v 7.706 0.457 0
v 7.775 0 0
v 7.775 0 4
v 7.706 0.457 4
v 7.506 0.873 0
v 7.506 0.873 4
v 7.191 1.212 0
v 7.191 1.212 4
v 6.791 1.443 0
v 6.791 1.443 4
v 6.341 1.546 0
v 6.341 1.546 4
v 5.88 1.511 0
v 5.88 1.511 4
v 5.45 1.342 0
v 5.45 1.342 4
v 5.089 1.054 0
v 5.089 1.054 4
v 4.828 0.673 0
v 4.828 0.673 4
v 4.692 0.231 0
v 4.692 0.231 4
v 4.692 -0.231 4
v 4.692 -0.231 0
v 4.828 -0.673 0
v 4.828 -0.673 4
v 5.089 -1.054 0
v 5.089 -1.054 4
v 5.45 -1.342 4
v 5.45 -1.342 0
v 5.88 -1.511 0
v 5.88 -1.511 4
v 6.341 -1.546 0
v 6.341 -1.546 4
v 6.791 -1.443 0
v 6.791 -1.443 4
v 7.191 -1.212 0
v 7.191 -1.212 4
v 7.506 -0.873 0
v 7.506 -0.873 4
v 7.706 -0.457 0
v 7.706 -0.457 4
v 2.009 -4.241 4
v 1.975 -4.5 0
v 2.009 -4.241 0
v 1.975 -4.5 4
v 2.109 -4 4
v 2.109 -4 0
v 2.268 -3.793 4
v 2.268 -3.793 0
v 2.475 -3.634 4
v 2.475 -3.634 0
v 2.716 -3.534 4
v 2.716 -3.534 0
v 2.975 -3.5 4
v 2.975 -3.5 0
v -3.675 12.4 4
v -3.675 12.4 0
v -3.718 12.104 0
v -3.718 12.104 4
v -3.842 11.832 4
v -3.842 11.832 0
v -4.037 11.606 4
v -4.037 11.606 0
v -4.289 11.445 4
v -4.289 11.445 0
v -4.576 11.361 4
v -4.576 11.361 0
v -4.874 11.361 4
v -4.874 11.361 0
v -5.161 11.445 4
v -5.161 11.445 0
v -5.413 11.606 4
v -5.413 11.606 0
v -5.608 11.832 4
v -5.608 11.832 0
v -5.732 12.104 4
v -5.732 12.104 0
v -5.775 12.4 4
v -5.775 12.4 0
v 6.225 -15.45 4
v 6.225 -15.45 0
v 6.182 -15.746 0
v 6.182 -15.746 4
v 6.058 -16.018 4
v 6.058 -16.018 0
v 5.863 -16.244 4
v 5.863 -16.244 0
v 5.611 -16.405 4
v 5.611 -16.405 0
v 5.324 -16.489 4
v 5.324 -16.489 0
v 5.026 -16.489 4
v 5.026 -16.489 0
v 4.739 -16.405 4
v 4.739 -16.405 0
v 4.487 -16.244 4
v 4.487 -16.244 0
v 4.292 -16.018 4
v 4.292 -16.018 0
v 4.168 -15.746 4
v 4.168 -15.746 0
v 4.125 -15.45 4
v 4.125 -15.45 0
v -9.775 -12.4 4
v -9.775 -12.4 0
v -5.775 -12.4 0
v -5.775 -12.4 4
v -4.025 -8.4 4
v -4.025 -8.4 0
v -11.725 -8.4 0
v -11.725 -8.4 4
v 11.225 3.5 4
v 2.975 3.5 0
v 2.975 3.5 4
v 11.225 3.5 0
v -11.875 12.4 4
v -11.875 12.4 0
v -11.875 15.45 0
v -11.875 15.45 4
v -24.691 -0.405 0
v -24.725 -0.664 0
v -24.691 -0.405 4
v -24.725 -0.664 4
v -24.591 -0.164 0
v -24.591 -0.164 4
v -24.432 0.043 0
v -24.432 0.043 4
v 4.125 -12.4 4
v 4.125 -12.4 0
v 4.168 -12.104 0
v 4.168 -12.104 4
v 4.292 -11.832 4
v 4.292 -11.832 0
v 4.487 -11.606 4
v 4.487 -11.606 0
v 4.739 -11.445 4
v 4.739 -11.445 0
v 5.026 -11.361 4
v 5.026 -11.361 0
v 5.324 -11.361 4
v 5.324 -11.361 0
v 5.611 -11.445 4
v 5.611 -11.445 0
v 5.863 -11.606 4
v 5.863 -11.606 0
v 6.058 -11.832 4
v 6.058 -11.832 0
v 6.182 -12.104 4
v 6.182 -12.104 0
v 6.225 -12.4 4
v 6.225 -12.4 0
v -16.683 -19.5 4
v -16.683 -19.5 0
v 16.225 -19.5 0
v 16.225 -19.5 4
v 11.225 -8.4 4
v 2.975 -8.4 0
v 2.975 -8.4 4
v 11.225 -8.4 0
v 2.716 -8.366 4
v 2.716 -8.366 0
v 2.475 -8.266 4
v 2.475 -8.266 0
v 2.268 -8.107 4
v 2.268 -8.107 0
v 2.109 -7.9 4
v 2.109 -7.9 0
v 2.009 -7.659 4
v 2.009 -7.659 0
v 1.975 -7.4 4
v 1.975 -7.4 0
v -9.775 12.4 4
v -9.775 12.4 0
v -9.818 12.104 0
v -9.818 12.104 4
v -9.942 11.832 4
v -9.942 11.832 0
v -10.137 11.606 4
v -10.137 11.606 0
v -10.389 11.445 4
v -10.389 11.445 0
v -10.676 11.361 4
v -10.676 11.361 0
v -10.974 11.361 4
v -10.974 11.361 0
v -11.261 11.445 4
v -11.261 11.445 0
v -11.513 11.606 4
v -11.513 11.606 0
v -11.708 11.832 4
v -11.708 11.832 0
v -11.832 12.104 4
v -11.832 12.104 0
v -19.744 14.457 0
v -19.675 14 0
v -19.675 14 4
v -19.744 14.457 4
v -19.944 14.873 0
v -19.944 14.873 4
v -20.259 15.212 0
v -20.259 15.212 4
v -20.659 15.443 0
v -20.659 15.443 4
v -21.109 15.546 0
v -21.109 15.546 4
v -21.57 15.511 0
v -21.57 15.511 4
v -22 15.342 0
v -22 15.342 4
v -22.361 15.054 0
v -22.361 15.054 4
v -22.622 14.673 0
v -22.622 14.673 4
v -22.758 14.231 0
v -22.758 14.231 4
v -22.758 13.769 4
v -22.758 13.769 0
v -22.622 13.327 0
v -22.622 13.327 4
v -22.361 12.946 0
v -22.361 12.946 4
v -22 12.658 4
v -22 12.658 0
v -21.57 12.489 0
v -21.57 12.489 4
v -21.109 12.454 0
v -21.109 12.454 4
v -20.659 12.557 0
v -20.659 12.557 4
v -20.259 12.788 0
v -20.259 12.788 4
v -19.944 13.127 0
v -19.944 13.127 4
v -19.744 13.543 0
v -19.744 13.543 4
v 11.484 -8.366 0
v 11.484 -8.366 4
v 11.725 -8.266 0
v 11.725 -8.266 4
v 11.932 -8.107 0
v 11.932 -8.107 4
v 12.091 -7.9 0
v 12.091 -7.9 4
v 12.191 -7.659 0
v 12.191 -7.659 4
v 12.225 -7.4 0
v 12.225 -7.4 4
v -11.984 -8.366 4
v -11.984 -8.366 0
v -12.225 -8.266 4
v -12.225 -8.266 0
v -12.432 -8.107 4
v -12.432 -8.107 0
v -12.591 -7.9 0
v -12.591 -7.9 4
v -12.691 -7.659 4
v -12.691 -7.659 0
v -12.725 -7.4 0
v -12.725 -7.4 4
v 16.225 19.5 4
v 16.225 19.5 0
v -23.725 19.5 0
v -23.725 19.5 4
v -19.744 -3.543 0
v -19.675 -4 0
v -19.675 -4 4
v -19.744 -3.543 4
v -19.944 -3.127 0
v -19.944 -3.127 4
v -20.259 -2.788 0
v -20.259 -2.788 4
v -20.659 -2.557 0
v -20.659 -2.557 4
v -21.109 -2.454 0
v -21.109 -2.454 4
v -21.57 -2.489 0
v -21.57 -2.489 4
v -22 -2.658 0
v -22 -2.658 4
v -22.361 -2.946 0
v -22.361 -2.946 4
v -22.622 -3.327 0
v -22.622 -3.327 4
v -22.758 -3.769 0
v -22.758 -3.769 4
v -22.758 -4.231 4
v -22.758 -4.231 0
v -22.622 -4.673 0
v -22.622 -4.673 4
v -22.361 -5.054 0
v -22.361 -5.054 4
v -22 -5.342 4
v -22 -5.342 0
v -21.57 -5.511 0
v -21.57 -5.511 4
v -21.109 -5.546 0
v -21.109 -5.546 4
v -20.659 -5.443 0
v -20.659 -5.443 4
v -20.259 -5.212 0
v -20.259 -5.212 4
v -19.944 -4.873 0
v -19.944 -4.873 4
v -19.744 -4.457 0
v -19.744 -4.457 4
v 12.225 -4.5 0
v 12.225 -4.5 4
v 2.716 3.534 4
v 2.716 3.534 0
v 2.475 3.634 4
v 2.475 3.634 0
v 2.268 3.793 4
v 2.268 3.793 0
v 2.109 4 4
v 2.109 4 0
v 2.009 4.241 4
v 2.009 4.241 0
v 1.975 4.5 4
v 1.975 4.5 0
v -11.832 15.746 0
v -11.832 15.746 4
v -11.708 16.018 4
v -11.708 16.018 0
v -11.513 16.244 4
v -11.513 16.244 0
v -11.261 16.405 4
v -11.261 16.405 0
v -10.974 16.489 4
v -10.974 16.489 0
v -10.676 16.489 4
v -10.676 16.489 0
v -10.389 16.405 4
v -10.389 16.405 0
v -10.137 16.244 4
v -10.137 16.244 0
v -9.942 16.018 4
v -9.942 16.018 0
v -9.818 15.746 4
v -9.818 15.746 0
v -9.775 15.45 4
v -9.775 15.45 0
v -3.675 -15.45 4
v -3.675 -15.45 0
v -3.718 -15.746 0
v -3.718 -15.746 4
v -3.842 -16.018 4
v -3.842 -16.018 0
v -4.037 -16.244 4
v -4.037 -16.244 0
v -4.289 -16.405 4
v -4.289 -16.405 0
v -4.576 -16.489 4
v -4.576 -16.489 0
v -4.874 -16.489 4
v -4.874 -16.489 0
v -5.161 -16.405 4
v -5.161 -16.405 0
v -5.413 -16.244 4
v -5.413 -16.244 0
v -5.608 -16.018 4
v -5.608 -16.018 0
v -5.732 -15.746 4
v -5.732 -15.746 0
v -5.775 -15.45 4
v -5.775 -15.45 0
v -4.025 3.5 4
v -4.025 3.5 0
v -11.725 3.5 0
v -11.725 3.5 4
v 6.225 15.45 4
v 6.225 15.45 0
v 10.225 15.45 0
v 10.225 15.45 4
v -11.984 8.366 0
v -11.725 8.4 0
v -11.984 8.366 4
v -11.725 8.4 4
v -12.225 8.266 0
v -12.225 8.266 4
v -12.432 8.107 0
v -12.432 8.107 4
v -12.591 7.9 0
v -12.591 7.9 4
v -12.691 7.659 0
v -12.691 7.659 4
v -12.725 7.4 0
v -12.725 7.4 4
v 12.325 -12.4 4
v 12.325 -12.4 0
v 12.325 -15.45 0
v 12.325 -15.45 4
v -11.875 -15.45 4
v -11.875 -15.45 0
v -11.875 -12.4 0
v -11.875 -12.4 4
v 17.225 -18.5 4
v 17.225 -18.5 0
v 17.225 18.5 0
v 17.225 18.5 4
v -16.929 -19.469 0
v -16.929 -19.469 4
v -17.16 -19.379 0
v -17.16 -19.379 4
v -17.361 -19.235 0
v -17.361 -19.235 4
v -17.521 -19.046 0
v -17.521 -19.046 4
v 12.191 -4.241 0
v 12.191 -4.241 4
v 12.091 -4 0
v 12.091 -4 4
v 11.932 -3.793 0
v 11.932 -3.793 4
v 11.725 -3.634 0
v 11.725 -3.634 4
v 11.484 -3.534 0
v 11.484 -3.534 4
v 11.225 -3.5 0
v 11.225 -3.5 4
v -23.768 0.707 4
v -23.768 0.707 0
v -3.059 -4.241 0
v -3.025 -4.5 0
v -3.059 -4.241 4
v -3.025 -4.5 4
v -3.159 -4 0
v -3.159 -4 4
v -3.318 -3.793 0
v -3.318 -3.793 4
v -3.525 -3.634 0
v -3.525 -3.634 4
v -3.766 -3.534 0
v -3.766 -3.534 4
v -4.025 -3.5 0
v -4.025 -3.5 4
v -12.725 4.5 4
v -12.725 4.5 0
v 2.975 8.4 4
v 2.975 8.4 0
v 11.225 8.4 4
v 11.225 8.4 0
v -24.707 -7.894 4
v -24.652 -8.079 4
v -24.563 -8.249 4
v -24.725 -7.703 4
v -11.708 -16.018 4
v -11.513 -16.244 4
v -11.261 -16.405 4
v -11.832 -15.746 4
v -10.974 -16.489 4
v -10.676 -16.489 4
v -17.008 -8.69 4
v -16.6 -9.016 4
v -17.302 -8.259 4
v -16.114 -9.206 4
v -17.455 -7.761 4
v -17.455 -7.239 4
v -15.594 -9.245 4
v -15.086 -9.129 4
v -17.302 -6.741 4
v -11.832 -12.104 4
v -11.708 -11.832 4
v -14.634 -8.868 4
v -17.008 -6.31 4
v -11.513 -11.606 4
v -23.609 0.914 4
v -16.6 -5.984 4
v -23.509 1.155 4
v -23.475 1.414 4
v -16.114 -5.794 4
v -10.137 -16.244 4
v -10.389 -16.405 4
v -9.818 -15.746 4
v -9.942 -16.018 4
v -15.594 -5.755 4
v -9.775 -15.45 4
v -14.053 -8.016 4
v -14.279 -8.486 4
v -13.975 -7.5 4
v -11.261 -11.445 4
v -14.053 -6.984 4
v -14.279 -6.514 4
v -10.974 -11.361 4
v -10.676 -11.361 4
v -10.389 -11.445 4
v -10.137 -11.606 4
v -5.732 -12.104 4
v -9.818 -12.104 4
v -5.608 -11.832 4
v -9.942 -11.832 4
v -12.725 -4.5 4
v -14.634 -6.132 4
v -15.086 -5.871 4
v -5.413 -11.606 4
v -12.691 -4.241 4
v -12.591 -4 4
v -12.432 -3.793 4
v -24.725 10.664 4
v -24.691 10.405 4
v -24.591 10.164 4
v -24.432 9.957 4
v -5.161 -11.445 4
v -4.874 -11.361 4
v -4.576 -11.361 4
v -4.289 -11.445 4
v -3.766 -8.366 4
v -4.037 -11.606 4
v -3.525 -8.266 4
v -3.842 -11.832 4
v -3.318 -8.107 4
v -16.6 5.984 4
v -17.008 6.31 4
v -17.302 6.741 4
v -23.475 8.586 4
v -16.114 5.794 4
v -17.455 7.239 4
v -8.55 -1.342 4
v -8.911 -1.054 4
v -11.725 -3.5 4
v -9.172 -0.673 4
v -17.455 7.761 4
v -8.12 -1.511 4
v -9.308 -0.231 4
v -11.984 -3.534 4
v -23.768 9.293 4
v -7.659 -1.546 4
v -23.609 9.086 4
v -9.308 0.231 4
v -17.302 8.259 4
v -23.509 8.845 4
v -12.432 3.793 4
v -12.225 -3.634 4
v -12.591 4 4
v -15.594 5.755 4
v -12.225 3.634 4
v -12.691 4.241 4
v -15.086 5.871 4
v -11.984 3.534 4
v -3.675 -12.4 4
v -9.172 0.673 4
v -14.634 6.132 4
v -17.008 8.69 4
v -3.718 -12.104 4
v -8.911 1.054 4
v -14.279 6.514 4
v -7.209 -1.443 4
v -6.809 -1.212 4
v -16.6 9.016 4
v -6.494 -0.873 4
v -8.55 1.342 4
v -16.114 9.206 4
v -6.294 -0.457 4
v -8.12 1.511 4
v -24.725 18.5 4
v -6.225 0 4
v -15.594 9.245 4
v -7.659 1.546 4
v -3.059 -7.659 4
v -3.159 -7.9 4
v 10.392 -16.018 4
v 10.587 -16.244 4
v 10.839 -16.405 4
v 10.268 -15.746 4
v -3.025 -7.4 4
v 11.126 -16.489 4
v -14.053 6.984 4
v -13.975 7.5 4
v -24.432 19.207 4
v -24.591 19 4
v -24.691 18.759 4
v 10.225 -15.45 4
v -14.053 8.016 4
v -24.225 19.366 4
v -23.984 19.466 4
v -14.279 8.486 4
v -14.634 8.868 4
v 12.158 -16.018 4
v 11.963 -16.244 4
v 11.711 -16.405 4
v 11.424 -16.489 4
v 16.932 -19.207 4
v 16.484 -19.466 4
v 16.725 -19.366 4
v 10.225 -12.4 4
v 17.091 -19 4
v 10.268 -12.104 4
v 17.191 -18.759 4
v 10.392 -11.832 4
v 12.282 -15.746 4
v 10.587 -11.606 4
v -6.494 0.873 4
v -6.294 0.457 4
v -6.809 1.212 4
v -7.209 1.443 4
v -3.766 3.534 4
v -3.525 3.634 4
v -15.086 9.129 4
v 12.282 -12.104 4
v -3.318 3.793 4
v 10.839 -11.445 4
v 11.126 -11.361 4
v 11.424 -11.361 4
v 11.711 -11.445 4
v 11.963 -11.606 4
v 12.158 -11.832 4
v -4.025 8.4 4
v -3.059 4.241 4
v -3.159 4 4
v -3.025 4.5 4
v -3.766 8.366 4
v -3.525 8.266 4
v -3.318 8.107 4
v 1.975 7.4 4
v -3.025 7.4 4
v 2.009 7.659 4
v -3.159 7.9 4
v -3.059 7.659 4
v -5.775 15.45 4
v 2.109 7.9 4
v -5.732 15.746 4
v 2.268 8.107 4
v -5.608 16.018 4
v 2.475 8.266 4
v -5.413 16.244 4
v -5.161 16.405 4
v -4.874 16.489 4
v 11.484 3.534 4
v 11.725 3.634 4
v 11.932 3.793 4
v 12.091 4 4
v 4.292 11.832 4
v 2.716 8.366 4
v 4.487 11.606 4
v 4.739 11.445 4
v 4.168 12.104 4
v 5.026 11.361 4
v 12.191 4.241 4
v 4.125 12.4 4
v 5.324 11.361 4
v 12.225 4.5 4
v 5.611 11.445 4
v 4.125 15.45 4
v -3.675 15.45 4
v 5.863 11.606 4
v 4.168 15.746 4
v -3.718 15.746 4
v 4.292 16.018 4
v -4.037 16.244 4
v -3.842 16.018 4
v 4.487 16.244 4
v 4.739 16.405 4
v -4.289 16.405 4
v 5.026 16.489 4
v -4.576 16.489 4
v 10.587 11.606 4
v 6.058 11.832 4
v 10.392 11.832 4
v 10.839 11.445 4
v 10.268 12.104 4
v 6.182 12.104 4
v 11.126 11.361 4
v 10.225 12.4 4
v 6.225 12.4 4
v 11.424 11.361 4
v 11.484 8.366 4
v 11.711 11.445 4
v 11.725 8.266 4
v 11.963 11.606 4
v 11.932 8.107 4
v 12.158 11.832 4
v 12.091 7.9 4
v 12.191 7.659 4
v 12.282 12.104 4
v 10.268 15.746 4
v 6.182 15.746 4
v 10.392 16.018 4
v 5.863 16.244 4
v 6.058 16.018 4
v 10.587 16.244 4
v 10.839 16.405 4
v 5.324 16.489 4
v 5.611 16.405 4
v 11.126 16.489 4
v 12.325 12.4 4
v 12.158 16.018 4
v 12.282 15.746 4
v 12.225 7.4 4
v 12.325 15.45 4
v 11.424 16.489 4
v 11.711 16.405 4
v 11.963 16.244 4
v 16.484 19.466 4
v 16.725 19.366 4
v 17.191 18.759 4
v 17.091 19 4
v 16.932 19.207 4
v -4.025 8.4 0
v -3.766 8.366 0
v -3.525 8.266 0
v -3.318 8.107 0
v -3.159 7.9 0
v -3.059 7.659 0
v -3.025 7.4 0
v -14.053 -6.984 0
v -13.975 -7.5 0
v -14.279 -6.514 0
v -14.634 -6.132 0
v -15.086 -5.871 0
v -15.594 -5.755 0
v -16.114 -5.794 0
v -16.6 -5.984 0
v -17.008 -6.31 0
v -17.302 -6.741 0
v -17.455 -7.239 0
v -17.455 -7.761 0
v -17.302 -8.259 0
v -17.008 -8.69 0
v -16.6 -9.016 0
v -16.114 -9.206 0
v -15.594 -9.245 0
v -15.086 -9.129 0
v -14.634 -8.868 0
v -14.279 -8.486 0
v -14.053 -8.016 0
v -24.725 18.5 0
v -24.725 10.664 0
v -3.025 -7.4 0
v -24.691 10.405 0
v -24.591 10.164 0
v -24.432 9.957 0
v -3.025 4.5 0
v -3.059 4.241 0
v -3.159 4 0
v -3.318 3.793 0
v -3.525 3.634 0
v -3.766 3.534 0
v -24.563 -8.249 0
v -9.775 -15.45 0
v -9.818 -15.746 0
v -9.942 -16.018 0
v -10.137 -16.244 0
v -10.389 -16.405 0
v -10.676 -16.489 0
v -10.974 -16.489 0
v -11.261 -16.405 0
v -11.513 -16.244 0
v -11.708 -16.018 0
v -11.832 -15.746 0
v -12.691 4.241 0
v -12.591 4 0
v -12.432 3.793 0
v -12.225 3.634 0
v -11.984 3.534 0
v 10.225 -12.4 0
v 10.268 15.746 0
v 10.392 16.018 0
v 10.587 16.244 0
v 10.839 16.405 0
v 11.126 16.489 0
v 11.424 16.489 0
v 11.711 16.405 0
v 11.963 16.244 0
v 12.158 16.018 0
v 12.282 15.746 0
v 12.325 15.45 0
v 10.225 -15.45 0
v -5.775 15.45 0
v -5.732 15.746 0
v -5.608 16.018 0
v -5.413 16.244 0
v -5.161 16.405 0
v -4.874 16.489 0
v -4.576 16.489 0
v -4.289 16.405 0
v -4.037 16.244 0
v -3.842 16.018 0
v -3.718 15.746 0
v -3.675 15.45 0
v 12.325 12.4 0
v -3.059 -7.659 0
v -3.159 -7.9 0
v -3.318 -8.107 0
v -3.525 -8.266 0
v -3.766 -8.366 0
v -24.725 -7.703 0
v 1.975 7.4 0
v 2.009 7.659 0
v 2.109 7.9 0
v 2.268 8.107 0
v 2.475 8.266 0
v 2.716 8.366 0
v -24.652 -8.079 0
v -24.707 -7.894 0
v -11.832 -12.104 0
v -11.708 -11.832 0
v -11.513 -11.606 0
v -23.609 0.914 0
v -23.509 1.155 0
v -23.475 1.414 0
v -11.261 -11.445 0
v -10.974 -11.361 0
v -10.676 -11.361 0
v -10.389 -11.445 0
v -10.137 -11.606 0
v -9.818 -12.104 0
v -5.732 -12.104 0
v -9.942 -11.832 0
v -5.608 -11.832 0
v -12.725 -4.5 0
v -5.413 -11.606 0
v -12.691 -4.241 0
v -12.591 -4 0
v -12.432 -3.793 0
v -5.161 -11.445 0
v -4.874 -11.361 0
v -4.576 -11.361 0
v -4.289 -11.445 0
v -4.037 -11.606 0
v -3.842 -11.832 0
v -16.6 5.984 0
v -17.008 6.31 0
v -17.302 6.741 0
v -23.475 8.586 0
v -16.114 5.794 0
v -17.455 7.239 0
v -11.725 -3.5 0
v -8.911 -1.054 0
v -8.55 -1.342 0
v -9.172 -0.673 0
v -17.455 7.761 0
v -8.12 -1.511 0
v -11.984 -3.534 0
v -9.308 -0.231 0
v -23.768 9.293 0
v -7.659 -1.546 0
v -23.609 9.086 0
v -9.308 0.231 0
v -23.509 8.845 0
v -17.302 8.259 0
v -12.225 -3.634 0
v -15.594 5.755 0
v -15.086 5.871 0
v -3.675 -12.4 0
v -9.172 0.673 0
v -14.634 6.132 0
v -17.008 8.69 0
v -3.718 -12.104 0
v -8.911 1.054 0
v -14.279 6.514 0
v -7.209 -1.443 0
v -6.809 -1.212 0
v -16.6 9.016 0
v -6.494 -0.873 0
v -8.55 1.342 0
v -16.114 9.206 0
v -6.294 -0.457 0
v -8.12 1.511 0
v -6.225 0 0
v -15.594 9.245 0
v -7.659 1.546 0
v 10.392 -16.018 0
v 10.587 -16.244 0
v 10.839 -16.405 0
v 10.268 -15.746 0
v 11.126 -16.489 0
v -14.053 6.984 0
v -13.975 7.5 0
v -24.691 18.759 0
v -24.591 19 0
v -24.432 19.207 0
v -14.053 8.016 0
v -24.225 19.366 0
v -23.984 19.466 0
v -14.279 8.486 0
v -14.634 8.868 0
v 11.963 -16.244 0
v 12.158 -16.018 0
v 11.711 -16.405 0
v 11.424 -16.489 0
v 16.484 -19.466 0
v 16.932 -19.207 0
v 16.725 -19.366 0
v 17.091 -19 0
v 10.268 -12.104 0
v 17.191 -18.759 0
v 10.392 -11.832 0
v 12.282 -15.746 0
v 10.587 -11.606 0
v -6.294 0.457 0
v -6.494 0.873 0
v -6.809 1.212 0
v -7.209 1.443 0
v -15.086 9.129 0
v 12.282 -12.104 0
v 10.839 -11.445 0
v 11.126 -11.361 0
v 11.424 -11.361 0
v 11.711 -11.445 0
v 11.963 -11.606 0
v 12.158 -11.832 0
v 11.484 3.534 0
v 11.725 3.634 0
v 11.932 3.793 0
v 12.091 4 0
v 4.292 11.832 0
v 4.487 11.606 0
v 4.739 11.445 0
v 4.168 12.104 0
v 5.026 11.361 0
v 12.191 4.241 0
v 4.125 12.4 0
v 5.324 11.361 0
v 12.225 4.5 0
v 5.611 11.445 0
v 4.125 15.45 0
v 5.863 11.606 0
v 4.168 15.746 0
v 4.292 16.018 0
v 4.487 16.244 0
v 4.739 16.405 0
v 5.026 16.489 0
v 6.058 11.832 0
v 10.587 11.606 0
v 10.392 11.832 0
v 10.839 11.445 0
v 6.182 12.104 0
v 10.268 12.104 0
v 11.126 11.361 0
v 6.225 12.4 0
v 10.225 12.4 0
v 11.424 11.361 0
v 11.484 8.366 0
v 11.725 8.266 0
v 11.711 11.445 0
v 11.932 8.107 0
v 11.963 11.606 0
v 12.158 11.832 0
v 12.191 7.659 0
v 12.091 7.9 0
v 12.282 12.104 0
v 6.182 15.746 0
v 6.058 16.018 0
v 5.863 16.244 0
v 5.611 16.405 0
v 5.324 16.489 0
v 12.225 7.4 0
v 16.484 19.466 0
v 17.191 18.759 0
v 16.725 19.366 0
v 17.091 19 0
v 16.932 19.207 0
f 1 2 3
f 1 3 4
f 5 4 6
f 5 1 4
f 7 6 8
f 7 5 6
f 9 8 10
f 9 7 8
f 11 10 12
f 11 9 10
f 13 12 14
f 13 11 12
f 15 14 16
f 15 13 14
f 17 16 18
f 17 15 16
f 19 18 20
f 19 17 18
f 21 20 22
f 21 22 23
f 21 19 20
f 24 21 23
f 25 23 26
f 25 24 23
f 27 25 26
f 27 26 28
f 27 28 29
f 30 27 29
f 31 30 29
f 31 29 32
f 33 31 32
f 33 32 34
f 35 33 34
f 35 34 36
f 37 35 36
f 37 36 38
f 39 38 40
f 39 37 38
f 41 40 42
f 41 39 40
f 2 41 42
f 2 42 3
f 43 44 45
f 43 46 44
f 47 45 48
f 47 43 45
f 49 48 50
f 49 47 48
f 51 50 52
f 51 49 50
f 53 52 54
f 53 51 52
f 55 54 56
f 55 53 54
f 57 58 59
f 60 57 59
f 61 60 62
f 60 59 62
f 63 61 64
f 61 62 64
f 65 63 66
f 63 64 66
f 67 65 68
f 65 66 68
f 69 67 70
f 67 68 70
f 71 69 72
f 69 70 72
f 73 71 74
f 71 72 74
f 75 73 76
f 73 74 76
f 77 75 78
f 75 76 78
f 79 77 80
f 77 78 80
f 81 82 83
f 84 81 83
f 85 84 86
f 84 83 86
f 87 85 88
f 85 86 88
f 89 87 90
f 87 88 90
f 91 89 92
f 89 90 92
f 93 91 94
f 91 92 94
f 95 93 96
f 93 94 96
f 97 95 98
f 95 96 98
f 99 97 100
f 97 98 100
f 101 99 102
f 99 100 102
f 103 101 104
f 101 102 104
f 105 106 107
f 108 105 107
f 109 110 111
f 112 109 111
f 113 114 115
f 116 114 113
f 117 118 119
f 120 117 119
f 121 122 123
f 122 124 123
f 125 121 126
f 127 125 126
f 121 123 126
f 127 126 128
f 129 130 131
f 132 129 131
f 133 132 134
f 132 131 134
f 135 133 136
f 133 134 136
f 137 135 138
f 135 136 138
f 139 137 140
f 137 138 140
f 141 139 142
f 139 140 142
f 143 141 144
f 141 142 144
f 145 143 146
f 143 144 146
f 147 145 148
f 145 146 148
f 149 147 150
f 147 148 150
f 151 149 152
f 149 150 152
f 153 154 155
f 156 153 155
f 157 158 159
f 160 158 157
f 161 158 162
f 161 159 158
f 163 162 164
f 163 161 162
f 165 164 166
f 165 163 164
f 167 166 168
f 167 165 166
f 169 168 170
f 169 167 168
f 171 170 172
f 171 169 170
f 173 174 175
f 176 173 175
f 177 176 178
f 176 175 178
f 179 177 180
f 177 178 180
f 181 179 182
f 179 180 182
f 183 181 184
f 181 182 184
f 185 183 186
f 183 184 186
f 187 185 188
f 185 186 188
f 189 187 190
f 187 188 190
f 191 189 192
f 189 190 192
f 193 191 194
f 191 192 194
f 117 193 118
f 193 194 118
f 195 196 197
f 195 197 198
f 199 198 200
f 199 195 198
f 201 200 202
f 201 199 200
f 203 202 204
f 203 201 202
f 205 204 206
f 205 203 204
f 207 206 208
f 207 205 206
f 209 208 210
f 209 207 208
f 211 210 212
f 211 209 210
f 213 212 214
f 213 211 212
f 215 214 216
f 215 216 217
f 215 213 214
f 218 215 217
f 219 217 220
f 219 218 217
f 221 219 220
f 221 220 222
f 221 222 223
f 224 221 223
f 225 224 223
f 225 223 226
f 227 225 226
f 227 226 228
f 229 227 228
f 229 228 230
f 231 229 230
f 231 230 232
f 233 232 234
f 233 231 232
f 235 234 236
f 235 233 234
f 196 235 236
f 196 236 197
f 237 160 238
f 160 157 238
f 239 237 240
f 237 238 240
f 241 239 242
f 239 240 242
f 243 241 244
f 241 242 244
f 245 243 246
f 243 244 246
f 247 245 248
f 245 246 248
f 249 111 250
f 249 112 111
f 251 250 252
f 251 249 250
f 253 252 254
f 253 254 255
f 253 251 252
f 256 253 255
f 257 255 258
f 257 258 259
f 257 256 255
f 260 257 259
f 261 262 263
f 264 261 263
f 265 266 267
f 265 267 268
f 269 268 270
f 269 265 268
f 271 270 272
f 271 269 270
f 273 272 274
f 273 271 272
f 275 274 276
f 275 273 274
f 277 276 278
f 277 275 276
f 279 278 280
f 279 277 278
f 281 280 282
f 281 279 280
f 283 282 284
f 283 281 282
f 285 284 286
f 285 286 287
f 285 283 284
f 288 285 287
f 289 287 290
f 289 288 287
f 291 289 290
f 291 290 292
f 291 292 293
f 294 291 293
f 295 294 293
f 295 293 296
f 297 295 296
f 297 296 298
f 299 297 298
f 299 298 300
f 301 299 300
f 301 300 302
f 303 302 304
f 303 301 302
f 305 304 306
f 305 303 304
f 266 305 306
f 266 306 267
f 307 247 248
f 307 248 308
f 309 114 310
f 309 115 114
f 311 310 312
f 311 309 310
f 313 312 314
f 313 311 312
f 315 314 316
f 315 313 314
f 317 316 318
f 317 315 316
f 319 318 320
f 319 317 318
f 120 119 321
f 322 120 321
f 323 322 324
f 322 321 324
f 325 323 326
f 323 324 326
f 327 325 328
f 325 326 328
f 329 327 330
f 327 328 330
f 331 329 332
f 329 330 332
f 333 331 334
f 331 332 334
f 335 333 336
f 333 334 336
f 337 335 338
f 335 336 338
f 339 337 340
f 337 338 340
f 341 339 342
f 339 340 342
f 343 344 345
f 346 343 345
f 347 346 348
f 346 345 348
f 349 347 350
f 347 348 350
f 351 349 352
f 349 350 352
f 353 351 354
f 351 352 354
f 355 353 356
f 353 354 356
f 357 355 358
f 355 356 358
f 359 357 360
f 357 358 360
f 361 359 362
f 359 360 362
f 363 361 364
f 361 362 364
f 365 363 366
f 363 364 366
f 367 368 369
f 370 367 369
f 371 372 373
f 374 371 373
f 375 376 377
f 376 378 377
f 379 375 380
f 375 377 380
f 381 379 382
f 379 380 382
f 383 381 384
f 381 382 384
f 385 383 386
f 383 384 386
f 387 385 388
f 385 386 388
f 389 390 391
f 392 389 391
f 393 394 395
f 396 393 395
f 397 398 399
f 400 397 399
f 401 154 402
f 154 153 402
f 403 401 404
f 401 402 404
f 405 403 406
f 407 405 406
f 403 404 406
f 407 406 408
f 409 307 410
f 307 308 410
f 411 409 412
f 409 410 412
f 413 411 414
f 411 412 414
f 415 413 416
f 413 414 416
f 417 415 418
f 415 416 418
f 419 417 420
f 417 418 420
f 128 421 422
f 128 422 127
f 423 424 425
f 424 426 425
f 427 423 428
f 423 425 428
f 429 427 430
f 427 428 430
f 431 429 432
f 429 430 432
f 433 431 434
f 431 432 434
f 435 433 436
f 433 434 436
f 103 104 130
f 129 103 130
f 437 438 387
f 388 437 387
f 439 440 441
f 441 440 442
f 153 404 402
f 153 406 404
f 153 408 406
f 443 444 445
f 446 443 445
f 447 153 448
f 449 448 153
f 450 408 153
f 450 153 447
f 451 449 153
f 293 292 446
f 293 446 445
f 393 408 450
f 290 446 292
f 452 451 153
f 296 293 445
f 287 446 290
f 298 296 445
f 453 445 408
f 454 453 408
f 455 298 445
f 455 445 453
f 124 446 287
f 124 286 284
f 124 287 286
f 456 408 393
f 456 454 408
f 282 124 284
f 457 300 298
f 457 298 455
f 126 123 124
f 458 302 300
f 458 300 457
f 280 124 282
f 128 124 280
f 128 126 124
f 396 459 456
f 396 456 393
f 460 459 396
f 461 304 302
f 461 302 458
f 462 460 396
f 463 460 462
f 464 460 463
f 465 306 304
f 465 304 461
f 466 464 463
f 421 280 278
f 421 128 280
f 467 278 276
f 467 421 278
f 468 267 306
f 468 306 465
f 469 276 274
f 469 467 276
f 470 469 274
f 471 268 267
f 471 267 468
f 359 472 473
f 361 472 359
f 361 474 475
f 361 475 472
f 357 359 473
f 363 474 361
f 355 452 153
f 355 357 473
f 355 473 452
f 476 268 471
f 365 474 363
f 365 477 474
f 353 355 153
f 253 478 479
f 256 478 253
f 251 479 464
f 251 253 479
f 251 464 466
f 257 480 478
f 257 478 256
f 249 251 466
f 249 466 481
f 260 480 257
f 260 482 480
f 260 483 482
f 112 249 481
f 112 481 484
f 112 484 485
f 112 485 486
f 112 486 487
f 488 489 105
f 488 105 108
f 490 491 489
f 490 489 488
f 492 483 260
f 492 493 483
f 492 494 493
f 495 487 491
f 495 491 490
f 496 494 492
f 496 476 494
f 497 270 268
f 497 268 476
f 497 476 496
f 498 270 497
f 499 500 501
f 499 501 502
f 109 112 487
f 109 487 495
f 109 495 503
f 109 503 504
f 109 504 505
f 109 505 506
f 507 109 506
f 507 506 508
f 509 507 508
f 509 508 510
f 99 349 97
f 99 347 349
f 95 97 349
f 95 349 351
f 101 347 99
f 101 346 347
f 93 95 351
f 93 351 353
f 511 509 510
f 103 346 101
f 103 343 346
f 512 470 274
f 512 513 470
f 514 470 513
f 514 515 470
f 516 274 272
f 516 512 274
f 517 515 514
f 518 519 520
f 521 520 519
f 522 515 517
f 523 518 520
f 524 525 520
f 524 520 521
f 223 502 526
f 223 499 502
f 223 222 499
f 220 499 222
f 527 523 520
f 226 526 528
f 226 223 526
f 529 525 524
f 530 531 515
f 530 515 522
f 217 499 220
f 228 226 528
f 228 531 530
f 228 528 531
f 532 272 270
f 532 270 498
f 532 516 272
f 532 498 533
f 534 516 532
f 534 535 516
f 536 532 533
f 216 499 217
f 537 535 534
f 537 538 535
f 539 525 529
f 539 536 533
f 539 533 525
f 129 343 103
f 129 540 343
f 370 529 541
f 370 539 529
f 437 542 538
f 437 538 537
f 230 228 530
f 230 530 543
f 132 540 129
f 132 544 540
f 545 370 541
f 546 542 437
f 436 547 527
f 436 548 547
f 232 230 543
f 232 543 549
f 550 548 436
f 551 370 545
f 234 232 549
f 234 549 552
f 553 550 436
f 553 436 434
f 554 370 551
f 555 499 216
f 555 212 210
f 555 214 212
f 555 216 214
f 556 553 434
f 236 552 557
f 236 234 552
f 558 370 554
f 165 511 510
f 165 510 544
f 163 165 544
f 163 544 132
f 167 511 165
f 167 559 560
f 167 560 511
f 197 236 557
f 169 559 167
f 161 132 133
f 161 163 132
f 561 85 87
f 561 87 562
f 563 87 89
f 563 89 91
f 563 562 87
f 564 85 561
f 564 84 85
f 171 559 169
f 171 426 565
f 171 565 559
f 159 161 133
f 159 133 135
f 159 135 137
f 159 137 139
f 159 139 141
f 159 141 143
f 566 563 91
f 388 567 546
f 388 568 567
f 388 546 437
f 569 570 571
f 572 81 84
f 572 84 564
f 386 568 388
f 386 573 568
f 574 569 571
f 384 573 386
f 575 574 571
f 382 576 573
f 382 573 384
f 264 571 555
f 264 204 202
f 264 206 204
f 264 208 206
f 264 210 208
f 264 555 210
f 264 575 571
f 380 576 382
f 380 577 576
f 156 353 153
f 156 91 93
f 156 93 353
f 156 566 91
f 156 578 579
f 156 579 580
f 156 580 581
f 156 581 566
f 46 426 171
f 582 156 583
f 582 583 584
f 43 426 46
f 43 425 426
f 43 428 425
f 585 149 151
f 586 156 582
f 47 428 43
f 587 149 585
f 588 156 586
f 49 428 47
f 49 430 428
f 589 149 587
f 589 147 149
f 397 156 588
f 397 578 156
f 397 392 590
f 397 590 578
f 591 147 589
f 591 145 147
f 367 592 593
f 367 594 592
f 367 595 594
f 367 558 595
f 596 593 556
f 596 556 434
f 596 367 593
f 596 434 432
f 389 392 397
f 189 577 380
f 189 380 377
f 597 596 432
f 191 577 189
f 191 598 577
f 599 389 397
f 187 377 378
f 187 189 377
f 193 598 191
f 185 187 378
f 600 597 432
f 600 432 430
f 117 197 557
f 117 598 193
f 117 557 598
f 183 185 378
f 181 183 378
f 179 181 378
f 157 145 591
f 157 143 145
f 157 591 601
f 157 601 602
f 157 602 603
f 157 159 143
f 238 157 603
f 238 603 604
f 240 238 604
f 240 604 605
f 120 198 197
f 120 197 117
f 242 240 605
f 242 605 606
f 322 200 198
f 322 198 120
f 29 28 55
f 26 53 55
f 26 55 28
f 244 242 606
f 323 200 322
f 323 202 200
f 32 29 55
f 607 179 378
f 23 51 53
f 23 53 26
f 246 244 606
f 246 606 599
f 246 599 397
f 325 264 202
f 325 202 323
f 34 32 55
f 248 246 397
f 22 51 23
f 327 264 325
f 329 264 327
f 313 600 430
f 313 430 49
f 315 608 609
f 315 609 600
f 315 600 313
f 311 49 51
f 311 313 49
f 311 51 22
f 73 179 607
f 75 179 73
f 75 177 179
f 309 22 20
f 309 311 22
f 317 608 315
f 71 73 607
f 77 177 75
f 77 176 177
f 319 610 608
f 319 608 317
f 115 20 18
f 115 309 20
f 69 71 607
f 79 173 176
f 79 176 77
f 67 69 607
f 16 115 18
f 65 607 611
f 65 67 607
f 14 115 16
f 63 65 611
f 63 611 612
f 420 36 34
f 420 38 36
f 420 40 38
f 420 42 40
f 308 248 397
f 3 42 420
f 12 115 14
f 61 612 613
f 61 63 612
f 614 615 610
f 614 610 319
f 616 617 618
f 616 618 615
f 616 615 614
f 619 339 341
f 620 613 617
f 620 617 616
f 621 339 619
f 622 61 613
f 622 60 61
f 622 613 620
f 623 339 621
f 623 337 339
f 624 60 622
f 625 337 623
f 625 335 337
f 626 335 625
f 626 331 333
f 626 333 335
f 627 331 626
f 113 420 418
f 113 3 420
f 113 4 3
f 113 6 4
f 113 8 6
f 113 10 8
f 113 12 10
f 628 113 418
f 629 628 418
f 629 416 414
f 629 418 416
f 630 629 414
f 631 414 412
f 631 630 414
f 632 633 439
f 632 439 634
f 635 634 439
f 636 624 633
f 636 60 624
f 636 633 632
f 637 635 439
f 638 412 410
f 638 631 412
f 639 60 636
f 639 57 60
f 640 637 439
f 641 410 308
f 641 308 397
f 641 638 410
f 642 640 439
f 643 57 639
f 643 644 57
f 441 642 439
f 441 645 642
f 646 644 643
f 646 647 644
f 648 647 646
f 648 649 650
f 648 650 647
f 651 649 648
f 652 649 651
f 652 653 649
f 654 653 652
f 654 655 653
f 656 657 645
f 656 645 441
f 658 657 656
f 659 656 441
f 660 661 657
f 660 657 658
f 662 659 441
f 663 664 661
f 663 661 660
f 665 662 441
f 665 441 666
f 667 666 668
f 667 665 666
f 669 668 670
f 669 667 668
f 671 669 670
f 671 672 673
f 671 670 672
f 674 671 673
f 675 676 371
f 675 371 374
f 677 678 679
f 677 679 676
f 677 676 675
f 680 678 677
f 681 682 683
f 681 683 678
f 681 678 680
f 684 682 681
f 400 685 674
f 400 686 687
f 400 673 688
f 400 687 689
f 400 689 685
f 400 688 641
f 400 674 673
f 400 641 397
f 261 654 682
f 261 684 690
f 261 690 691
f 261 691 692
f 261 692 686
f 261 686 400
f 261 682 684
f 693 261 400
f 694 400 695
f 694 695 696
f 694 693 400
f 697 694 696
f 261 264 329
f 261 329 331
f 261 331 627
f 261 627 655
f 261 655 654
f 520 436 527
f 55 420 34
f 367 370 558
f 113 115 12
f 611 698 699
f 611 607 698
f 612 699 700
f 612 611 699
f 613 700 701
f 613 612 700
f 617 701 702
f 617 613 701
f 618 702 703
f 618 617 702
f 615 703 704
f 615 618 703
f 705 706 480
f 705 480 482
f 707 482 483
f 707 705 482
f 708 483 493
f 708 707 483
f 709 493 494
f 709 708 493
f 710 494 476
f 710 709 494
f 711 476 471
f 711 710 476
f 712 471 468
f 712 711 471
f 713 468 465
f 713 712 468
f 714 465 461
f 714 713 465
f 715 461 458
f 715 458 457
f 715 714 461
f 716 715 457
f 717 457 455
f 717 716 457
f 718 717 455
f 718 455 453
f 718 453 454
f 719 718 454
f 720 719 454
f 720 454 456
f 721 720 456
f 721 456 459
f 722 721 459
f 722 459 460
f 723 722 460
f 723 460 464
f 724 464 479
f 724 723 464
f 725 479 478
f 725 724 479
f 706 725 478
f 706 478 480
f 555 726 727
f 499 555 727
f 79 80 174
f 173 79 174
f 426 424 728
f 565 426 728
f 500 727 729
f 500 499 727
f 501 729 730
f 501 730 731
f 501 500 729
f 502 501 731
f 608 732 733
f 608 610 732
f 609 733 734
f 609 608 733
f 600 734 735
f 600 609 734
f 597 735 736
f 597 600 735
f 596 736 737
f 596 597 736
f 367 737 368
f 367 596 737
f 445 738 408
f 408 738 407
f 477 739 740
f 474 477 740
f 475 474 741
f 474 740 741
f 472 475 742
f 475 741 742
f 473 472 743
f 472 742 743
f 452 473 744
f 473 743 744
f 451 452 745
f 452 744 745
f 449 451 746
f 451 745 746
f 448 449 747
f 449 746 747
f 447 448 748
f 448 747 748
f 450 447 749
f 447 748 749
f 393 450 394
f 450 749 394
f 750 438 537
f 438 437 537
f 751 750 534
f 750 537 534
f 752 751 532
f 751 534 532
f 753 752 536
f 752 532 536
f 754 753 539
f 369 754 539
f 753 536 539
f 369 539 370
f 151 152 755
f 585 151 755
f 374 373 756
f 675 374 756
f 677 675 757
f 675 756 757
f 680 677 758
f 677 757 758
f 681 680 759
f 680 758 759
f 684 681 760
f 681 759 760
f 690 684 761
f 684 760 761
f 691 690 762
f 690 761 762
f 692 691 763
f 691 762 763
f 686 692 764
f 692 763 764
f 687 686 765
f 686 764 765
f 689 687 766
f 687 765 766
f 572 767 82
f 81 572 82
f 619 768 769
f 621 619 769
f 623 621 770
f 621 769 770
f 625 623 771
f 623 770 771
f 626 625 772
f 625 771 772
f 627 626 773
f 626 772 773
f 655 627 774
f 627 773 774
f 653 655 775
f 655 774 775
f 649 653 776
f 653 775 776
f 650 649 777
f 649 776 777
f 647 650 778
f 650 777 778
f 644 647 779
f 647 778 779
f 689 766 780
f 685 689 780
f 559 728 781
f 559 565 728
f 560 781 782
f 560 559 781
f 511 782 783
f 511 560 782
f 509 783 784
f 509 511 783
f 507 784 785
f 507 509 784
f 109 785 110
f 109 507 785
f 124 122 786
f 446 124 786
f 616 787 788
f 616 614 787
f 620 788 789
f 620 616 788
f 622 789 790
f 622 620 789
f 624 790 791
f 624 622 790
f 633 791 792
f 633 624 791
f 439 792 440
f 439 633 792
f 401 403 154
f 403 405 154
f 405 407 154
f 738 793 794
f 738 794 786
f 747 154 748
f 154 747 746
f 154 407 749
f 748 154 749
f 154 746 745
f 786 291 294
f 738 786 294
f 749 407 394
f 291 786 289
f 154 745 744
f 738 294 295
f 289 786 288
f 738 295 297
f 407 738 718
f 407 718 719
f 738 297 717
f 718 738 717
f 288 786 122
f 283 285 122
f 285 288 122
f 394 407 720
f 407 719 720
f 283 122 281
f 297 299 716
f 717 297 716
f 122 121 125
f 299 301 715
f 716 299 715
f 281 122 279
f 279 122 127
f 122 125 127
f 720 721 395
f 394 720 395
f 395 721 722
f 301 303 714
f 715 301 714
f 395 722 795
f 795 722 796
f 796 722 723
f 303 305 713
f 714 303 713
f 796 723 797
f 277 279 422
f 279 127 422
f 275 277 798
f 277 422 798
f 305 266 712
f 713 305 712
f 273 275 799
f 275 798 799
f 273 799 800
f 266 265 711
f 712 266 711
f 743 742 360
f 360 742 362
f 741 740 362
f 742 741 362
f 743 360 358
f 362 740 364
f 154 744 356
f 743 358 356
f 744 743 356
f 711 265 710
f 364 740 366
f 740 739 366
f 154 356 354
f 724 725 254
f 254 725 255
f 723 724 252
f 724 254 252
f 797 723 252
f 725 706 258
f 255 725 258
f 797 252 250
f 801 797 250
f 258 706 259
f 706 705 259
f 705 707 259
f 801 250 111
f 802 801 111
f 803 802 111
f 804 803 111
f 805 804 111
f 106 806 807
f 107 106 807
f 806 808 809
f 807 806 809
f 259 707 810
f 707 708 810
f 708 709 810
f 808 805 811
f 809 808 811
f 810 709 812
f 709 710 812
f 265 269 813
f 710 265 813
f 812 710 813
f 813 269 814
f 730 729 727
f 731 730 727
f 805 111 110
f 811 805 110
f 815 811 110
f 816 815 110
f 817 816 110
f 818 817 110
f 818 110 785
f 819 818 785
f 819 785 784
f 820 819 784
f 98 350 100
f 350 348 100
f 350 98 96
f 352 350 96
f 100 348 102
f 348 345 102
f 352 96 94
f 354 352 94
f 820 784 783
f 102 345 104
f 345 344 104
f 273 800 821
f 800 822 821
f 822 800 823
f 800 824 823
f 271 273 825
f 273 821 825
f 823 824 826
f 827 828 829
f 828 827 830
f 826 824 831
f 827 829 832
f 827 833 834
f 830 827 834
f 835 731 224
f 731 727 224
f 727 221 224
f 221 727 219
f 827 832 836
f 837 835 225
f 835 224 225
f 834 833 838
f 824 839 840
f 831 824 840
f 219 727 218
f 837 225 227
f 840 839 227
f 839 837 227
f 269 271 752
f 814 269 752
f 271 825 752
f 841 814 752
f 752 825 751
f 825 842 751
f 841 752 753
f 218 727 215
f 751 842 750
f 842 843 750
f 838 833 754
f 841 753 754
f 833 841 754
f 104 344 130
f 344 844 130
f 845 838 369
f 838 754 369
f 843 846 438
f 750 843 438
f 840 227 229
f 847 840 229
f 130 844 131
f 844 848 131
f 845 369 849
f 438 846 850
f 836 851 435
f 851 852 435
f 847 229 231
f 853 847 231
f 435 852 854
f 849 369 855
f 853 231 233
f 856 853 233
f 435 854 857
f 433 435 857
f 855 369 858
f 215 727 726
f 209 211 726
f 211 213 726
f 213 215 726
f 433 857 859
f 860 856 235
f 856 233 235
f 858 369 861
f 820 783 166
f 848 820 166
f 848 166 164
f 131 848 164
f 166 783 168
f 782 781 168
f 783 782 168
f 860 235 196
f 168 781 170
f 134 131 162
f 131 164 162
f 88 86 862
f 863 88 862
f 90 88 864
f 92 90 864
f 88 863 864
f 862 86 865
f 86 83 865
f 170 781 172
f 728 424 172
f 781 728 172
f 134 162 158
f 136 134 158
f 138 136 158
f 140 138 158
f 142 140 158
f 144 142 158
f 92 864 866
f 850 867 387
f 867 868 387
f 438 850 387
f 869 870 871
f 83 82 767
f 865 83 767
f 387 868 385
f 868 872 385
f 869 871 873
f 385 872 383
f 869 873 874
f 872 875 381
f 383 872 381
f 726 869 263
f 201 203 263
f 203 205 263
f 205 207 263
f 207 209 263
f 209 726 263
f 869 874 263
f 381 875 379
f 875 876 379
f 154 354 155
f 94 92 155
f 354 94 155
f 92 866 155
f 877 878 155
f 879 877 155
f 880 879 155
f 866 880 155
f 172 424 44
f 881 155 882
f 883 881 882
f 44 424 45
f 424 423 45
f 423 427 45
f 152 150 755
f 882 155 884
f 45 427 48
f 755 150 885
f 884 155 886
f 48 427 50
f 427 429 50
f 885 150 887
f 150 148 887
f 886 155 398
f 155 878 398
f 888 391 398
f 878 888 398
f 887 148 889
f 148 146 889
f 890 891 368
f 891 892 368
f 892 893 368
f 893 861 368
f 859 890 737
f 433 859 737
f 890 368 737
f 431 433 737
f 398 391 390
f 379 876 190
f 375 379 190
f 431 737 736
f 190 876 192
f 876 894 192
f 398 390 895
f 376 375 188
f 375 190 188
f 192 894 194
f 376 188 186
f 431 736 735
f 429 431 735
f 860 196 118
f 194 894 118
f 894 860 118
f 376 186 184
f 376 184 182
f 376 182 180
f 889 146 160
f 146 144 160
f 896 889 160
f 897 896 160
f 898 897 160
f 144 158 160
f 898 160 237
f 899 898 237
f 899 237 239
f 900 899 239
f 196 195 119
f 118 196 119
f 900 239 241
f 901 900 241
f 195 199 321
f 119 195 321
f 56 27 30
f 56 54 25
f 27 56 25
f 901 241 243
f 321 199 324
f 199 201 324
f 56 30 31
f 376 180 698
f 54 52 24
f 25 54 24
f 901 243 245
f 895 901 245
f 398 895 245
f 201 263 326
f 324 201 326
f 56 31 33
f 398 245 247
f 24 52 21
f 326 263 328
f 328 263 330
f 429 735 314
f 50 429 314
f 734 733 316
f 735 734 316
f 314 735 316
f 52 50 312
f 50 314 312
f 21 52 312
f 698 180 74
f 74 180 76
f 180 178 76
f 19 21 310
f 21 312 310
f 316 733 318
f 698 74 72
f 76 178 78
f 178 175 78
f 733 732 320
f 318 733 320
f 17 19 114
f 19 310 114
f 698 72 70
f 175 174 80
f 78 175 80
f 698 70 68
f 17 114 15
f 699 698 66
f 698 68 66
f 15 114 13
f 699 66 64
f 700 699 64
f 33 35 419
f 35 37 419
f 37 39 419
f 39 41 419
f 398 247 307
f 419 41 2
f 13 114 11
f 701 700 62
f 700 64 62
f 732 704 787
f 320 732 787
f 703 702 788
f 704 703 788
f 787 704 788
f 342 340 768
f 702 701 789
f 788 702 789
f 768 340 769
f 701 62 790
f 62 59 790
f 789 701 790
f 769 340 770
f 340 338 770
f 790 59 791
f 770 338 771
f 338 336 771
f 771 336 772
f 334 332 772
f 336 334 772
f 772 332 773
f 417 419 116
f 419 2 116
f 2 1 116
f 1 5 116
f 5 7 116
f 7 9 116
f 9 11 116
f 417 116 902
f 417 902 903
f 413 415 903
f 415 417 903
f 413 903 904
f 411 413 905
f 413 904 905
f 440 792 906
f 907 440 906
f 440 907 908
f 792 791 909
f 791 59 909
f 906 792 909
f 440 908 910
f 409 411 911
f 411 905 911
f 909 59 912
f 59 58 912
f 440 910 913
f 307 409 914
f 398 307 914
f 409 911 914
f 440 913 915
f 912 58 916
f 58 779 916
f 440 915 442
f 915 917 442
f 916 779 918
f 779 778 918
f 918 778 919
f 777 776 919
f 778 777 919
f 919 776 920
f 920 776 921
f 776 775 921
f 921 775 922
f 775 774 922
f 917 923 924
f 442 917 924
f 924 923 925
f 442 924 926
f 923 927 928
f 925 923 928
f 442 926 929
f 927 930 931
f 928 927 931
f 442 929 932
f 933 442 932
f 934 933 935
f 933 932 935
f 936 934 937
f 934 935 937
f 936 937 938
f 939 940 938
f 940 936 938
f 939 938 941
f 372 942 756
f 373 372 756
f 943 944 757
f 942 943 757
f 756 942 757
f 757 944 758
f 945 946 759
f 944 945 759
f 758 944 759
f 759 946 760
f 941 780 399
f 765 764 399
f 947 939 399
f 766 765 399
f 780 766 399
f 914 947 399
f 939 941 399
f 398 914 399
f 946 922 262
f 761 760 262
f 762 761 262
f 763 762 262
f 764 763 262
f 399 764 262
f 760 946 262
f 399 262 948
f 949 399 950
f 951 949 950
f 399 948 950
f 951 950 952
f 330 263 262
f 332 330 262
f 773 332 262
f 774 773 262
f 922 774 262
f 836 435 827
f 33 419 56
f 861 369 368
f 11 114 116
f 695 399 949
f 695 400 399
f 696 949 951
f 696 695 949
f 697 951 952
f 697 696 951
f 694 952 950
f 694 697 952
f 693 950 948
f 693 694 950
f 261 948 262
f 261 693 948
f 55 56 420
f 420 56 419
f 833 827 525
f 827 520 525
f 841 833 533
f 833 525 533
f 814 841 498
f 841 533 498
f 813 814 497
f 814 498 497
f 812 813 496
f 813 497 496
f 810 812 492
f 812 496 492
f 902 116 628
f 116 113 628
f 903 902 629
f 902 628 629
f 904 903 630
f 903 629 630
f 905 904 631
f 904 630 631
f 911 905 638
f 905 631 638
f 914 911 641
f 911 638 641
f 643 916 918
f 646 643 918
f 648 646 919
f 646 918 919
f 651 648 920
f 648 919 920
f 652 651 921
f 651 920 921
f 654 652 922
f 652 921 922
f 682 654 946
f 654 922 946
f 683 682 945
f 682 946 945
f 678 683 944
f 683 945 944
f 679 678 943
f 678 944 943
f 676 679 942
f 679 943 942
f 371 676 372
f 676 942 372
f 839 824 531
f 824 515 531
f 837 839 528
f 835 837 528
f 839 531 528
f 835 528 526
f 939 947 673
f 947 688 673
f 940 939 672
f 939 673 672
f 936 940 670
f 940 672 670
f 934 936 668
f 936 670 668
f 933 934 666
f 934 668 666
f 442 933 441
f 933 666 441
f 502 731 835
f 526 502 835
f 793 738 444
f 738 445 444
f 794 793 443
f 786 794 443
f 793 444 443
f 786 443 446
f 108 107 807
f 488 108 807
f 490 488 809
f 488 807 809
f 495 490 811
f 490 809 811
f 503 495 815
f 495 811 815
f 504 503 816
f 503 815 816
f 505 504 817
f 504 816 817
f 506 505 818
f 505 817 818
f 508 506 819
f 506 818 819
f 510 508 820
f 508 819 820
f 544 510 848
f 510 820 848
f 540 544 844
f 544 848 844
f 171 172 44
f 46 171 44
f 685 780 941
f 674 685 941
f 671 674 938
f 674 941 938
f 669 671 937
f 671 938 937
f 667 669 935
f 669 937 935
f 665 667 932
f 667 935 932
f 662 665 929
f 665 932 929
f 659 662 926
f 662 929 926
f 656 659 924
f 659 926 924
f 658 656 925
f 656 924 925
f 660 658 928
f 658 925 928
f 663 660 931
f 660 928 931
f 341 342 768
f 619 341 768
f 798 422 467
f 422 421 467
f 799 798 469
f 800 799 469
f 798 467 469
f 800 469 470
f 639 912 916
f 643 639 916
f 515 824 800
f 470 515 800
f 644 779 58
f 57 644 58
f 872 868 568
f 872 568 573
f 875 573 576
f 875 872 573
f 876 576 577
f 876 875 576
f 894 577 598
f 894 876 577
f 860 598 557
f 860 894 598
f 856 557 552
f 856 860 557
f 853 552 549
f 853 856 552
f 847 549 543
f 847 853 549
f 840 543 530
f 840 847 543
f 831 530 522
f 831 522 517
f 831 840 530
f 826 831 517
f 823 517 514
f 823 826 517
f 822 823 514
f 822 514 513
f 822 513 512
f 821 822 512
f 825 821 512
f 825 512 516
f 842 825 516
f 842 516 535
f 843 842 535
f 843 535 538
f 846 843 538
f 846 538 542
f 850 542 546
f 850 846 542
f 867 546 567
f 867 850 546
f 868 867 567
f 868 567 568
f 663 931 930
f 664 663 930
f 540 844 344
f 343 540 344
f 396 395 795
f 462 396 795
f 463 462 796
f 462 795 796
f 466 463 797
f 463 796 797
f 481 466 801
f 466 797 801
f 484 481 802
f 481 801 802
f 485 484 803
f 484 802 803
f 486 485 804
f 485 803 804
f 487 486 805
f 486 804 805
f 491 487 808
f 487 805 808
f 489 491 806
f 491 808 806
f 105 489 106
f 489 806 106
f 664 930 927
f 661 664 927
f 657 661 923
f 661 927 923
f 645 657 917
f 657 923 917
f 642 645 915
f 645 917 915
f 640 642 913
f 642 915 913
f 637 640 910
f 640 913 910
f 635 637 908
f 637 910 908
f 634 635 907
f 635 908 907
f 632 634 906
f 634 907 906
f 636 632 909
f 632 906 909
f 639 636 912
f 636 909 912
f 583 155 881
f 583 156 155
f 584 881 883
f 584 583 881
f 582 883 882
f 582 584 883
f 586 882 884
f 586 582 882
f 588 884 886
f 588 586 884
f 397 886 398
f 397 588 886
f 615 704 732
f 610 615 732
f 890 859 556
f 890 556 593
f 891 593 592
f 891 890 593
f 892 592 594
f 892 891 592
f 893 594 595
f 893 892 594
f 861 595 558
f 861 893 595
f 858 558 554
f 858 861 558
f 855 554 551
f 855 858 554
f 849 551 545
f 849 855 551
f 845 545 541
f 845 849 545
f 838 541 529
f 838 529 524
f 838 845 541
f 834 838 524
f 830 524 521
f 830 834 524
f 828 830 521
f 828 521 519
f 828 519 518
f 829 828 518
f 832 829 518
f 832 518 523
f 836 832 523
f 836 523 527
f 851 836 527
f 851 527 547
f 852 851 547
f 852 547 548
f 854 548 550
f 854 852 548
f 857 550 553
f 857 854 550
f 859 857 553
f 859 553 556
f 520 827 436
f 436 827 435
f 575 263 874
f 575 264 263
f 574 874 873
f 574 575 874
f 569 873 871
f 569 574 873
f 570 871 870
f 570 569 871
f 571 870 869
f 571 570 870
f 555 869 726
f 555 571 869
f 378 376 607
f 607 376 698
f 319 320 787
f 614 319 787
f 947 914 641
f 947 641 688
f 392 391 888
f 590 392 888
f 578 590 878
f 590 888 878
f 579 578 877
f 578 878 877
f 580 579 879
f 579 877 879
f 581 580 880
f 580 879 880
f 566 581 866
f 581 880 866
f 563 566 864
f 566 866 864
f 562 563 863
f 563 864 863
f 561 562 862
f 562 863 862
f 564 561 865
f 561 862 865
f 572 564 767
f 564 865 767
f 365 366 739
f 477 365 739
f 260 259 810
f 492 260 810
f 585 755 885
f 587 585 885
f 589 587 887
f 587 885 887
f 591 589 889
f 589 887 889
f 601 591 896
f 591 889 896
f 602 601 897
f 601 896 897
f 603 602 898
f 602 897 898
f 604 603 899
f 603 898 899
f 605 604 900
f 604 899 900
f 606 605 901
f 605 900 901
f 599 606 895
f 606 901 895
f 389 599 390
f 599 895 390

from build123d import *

# Parameters (mm, degrees)
SKETCH_1_R      = 1.75
SKETCH_1_R_2    = 1.55
SKETCH_1_W      = 10.25
SKETCH_1_H      = 4.9
EXTRUDE_1_DEPTH = 4
FILLET_1_R      = 1


with BuildPart() as part:
    # 草图1 → 凸台-拉伸1 (new body)
    with BuildSketch(Plane.XY):
        Polygon((-17.225, -19.5), (17.225, -19.5), (17.225, 19.5), (-14.225, 19.5), (-24.725, 19.5), (-24.725, 10.25), (-23.475, 9), (-23.475, 1), (-24.725, -0.25), (-24.725, -8), align=None)
        with BuildLine():
            Line((-5.775, -15.45), (-9.775, -15.45))
            ThreePointArc((-9.775, -15.45), (-10.825, -16.5), (-11.875, -15.45))
            Line((-11.875, -15.45), (-11.875, -12.4))
            ThreePointArc((-11.875, -12.4), (-10.825, -11.35), (-9.775, -12.4))
            Line((-9.775, -12.4), (-5.775, -12.4))
            ThreePointArc((-5.775, -12.4), (-4.725, -11.35), (-3.675, -12.4))
            Line((-3.675, -12.4), (-3.675, -15.45))
            ThreePointArc((-3.675, -15.45), (-4.725, -16.5), (-5.775, -15.45))
        make_face(mode=Mode.SUBTRACT)
        with Locations((-15.725, -7.5)):
            Circle(SKETCH_1_R, mode=Mode.SUBTRACT)
        with Locations((-21.225, -4)):
            Circle(SKETCH_1_R_2, mode=Mode.SUBTRACT)
        Polygon((-3.025, -8.4), (-12.225, -8.4), (-12.725, -8.4), (-12.725, -3.5), (-12.225, -3.5), (-3.025, -3.5), align=None, mode=Mode.SUBTRACT)
        with BuildLine():
            ThreePointArc((6.225, -15.45), (5.175, -16.5), (4.125, -15.45))
            Line((4.125, -15.45), (4.125, -12.4))
            ThreePointArc((4.125, -12.4), (5.175, -11.35), (6.225, -12.4))
            Line((6.225, -12.4), (10.225, -12.4))
            ThreePointArc((10.225, -12.4), (11.275, -11.35), (12.325, -12.4))
            Line((12.325, -12.4), (12.325, -15.45))
            ThreePointArc((12.325, -15.45), (11.275, -16.5), (10.225, -15.45))
            Line((10.225, -15.45), (6.225, -15.45))
        make_face(mode=Mode.SUBTRACT)
        with Locations((7.1, -5.95)):
            Rectangle(SKETCH_1_W, SKETCH_1_H, mode=Mode.SUBTRACT)
        with Locations((-15.725, 7.5)):
            Circle(SKETCH_1_R, mode=Mode.SUBTRACT)
        with Locations((-7.775, 0)):
            Circle(SKETCH_1_R_2, mode=Mode.SUBTRACT)
        Polygon((-12.225, 8.4), (-3.025, 8.4), (-3.025, 3.5), (-12.225, 3.5), (-12.725, 3.5), (-12.725, 8.4), align=None, mode=Mode.SUBTRACT)
        with Locations((-21.225, 14)):
            Circle(SKETCH_1_R_2, mode=Mode.SUBTRACT)
        with BuildLine():
            Line((-5.775, 12.4), (-9.775, 12.4))
            ThreePointArc((-9.775, 12.4), (-10.825, 11.35), (-11.875, 12.4))
            Line((-11.875, 12.4), (-11.875, 15.45))
            ThreePointArc((-11.875, 15.45), (-10.825, 16.5), (-9.775, 15.45))
            Line((-9.775, 15.45), (-5.775, 15.45))
            ThreePointArc((-5.775, 15.45), (-4.725, 16.5), (-3.675, 15.45))
            Line((-3.675, 15.45), (-3.675, 12.4))
            ThreePointArc((-3.675, 12.4), (-4.725, 11.35), (-5.775, 12.4))
        make_face(mode=Mode.SUBTRACT)
        with Locations((6.225, 0)):
            Circle(SKETCH_1_R_2, mode=Mode.SUBTRACT)
        with Locations((7.1, 5.95)):
            Rectangle(SKETCH_1_W, SKETCH_1_H, mode=Mode.SUBTRACT)
        with BuildLine():
            Line((10.225, 12.4), (6.225, 12.4))
            ThreePointArc((6.225, 12.4), (5.175, 11.35), (4.125, 12.4))
            Line((4.125, 12.4), (4.125, 15.45))
            ThreePointArc((4.125, 15.45), (5.175, 16.5), (6.225, 15.45))
            Line((6.225, 15.45), (10.225, 15.45))
            ThreePointArc((10.225, 15.45), (11.275, 16.5), (12.325, 15.45))
            Line((12.325, 15.45), (12.325, 12.4))
            ThreePointArc((12.325, 12.4), (11.275, 11.35), (10.225, 12.4))
        make_face(mode=Mode.SUBTRACT)
    extrude(amount=EXTRUDE_1_DEPTH)

    # 圆角1
    fillet_1_edges = [part.edges().sort_by_distance(p)[0] for p in [
        (-23.475, 1, 2),
        (-23.475, 9, 2),
        (-24.725, 10.25, 2),
        (-24.725, 19.5, 2),
        (17.225, 19.5, 2),
        (17.225, -19.5, 2),
        (-17.225, -19.5, 2),
        (-24.725, -8, 2),
        (-24.725, -0.25, 2),
        (-3.025, -8.4, 2),
        (-3.025, -3.5, 2),
        (-12.725, -3.5, 2),
        (-12.725, -8.4, 2),
        (-3.025, 3.5, 2),
        (-3.025, 8.4, 2),
        (-12.725, 8.4, 2),
        (-12.725, 3.5, 2),
        (12.225, 8.4, 2),
        (1.975, 8.4, 2),
        (1.975, 3.5, 2),
        (12.225, 3.5, 2),
        (1.975, -8.4, 2),
        (12.225, -8.4, 2),
        (12.225, -3.5, 2),
        (1.975, -3.5, 2),
    ]]
    fillet(fillet_1_edges, radius=FILLET_1_R)


solid = part.part
